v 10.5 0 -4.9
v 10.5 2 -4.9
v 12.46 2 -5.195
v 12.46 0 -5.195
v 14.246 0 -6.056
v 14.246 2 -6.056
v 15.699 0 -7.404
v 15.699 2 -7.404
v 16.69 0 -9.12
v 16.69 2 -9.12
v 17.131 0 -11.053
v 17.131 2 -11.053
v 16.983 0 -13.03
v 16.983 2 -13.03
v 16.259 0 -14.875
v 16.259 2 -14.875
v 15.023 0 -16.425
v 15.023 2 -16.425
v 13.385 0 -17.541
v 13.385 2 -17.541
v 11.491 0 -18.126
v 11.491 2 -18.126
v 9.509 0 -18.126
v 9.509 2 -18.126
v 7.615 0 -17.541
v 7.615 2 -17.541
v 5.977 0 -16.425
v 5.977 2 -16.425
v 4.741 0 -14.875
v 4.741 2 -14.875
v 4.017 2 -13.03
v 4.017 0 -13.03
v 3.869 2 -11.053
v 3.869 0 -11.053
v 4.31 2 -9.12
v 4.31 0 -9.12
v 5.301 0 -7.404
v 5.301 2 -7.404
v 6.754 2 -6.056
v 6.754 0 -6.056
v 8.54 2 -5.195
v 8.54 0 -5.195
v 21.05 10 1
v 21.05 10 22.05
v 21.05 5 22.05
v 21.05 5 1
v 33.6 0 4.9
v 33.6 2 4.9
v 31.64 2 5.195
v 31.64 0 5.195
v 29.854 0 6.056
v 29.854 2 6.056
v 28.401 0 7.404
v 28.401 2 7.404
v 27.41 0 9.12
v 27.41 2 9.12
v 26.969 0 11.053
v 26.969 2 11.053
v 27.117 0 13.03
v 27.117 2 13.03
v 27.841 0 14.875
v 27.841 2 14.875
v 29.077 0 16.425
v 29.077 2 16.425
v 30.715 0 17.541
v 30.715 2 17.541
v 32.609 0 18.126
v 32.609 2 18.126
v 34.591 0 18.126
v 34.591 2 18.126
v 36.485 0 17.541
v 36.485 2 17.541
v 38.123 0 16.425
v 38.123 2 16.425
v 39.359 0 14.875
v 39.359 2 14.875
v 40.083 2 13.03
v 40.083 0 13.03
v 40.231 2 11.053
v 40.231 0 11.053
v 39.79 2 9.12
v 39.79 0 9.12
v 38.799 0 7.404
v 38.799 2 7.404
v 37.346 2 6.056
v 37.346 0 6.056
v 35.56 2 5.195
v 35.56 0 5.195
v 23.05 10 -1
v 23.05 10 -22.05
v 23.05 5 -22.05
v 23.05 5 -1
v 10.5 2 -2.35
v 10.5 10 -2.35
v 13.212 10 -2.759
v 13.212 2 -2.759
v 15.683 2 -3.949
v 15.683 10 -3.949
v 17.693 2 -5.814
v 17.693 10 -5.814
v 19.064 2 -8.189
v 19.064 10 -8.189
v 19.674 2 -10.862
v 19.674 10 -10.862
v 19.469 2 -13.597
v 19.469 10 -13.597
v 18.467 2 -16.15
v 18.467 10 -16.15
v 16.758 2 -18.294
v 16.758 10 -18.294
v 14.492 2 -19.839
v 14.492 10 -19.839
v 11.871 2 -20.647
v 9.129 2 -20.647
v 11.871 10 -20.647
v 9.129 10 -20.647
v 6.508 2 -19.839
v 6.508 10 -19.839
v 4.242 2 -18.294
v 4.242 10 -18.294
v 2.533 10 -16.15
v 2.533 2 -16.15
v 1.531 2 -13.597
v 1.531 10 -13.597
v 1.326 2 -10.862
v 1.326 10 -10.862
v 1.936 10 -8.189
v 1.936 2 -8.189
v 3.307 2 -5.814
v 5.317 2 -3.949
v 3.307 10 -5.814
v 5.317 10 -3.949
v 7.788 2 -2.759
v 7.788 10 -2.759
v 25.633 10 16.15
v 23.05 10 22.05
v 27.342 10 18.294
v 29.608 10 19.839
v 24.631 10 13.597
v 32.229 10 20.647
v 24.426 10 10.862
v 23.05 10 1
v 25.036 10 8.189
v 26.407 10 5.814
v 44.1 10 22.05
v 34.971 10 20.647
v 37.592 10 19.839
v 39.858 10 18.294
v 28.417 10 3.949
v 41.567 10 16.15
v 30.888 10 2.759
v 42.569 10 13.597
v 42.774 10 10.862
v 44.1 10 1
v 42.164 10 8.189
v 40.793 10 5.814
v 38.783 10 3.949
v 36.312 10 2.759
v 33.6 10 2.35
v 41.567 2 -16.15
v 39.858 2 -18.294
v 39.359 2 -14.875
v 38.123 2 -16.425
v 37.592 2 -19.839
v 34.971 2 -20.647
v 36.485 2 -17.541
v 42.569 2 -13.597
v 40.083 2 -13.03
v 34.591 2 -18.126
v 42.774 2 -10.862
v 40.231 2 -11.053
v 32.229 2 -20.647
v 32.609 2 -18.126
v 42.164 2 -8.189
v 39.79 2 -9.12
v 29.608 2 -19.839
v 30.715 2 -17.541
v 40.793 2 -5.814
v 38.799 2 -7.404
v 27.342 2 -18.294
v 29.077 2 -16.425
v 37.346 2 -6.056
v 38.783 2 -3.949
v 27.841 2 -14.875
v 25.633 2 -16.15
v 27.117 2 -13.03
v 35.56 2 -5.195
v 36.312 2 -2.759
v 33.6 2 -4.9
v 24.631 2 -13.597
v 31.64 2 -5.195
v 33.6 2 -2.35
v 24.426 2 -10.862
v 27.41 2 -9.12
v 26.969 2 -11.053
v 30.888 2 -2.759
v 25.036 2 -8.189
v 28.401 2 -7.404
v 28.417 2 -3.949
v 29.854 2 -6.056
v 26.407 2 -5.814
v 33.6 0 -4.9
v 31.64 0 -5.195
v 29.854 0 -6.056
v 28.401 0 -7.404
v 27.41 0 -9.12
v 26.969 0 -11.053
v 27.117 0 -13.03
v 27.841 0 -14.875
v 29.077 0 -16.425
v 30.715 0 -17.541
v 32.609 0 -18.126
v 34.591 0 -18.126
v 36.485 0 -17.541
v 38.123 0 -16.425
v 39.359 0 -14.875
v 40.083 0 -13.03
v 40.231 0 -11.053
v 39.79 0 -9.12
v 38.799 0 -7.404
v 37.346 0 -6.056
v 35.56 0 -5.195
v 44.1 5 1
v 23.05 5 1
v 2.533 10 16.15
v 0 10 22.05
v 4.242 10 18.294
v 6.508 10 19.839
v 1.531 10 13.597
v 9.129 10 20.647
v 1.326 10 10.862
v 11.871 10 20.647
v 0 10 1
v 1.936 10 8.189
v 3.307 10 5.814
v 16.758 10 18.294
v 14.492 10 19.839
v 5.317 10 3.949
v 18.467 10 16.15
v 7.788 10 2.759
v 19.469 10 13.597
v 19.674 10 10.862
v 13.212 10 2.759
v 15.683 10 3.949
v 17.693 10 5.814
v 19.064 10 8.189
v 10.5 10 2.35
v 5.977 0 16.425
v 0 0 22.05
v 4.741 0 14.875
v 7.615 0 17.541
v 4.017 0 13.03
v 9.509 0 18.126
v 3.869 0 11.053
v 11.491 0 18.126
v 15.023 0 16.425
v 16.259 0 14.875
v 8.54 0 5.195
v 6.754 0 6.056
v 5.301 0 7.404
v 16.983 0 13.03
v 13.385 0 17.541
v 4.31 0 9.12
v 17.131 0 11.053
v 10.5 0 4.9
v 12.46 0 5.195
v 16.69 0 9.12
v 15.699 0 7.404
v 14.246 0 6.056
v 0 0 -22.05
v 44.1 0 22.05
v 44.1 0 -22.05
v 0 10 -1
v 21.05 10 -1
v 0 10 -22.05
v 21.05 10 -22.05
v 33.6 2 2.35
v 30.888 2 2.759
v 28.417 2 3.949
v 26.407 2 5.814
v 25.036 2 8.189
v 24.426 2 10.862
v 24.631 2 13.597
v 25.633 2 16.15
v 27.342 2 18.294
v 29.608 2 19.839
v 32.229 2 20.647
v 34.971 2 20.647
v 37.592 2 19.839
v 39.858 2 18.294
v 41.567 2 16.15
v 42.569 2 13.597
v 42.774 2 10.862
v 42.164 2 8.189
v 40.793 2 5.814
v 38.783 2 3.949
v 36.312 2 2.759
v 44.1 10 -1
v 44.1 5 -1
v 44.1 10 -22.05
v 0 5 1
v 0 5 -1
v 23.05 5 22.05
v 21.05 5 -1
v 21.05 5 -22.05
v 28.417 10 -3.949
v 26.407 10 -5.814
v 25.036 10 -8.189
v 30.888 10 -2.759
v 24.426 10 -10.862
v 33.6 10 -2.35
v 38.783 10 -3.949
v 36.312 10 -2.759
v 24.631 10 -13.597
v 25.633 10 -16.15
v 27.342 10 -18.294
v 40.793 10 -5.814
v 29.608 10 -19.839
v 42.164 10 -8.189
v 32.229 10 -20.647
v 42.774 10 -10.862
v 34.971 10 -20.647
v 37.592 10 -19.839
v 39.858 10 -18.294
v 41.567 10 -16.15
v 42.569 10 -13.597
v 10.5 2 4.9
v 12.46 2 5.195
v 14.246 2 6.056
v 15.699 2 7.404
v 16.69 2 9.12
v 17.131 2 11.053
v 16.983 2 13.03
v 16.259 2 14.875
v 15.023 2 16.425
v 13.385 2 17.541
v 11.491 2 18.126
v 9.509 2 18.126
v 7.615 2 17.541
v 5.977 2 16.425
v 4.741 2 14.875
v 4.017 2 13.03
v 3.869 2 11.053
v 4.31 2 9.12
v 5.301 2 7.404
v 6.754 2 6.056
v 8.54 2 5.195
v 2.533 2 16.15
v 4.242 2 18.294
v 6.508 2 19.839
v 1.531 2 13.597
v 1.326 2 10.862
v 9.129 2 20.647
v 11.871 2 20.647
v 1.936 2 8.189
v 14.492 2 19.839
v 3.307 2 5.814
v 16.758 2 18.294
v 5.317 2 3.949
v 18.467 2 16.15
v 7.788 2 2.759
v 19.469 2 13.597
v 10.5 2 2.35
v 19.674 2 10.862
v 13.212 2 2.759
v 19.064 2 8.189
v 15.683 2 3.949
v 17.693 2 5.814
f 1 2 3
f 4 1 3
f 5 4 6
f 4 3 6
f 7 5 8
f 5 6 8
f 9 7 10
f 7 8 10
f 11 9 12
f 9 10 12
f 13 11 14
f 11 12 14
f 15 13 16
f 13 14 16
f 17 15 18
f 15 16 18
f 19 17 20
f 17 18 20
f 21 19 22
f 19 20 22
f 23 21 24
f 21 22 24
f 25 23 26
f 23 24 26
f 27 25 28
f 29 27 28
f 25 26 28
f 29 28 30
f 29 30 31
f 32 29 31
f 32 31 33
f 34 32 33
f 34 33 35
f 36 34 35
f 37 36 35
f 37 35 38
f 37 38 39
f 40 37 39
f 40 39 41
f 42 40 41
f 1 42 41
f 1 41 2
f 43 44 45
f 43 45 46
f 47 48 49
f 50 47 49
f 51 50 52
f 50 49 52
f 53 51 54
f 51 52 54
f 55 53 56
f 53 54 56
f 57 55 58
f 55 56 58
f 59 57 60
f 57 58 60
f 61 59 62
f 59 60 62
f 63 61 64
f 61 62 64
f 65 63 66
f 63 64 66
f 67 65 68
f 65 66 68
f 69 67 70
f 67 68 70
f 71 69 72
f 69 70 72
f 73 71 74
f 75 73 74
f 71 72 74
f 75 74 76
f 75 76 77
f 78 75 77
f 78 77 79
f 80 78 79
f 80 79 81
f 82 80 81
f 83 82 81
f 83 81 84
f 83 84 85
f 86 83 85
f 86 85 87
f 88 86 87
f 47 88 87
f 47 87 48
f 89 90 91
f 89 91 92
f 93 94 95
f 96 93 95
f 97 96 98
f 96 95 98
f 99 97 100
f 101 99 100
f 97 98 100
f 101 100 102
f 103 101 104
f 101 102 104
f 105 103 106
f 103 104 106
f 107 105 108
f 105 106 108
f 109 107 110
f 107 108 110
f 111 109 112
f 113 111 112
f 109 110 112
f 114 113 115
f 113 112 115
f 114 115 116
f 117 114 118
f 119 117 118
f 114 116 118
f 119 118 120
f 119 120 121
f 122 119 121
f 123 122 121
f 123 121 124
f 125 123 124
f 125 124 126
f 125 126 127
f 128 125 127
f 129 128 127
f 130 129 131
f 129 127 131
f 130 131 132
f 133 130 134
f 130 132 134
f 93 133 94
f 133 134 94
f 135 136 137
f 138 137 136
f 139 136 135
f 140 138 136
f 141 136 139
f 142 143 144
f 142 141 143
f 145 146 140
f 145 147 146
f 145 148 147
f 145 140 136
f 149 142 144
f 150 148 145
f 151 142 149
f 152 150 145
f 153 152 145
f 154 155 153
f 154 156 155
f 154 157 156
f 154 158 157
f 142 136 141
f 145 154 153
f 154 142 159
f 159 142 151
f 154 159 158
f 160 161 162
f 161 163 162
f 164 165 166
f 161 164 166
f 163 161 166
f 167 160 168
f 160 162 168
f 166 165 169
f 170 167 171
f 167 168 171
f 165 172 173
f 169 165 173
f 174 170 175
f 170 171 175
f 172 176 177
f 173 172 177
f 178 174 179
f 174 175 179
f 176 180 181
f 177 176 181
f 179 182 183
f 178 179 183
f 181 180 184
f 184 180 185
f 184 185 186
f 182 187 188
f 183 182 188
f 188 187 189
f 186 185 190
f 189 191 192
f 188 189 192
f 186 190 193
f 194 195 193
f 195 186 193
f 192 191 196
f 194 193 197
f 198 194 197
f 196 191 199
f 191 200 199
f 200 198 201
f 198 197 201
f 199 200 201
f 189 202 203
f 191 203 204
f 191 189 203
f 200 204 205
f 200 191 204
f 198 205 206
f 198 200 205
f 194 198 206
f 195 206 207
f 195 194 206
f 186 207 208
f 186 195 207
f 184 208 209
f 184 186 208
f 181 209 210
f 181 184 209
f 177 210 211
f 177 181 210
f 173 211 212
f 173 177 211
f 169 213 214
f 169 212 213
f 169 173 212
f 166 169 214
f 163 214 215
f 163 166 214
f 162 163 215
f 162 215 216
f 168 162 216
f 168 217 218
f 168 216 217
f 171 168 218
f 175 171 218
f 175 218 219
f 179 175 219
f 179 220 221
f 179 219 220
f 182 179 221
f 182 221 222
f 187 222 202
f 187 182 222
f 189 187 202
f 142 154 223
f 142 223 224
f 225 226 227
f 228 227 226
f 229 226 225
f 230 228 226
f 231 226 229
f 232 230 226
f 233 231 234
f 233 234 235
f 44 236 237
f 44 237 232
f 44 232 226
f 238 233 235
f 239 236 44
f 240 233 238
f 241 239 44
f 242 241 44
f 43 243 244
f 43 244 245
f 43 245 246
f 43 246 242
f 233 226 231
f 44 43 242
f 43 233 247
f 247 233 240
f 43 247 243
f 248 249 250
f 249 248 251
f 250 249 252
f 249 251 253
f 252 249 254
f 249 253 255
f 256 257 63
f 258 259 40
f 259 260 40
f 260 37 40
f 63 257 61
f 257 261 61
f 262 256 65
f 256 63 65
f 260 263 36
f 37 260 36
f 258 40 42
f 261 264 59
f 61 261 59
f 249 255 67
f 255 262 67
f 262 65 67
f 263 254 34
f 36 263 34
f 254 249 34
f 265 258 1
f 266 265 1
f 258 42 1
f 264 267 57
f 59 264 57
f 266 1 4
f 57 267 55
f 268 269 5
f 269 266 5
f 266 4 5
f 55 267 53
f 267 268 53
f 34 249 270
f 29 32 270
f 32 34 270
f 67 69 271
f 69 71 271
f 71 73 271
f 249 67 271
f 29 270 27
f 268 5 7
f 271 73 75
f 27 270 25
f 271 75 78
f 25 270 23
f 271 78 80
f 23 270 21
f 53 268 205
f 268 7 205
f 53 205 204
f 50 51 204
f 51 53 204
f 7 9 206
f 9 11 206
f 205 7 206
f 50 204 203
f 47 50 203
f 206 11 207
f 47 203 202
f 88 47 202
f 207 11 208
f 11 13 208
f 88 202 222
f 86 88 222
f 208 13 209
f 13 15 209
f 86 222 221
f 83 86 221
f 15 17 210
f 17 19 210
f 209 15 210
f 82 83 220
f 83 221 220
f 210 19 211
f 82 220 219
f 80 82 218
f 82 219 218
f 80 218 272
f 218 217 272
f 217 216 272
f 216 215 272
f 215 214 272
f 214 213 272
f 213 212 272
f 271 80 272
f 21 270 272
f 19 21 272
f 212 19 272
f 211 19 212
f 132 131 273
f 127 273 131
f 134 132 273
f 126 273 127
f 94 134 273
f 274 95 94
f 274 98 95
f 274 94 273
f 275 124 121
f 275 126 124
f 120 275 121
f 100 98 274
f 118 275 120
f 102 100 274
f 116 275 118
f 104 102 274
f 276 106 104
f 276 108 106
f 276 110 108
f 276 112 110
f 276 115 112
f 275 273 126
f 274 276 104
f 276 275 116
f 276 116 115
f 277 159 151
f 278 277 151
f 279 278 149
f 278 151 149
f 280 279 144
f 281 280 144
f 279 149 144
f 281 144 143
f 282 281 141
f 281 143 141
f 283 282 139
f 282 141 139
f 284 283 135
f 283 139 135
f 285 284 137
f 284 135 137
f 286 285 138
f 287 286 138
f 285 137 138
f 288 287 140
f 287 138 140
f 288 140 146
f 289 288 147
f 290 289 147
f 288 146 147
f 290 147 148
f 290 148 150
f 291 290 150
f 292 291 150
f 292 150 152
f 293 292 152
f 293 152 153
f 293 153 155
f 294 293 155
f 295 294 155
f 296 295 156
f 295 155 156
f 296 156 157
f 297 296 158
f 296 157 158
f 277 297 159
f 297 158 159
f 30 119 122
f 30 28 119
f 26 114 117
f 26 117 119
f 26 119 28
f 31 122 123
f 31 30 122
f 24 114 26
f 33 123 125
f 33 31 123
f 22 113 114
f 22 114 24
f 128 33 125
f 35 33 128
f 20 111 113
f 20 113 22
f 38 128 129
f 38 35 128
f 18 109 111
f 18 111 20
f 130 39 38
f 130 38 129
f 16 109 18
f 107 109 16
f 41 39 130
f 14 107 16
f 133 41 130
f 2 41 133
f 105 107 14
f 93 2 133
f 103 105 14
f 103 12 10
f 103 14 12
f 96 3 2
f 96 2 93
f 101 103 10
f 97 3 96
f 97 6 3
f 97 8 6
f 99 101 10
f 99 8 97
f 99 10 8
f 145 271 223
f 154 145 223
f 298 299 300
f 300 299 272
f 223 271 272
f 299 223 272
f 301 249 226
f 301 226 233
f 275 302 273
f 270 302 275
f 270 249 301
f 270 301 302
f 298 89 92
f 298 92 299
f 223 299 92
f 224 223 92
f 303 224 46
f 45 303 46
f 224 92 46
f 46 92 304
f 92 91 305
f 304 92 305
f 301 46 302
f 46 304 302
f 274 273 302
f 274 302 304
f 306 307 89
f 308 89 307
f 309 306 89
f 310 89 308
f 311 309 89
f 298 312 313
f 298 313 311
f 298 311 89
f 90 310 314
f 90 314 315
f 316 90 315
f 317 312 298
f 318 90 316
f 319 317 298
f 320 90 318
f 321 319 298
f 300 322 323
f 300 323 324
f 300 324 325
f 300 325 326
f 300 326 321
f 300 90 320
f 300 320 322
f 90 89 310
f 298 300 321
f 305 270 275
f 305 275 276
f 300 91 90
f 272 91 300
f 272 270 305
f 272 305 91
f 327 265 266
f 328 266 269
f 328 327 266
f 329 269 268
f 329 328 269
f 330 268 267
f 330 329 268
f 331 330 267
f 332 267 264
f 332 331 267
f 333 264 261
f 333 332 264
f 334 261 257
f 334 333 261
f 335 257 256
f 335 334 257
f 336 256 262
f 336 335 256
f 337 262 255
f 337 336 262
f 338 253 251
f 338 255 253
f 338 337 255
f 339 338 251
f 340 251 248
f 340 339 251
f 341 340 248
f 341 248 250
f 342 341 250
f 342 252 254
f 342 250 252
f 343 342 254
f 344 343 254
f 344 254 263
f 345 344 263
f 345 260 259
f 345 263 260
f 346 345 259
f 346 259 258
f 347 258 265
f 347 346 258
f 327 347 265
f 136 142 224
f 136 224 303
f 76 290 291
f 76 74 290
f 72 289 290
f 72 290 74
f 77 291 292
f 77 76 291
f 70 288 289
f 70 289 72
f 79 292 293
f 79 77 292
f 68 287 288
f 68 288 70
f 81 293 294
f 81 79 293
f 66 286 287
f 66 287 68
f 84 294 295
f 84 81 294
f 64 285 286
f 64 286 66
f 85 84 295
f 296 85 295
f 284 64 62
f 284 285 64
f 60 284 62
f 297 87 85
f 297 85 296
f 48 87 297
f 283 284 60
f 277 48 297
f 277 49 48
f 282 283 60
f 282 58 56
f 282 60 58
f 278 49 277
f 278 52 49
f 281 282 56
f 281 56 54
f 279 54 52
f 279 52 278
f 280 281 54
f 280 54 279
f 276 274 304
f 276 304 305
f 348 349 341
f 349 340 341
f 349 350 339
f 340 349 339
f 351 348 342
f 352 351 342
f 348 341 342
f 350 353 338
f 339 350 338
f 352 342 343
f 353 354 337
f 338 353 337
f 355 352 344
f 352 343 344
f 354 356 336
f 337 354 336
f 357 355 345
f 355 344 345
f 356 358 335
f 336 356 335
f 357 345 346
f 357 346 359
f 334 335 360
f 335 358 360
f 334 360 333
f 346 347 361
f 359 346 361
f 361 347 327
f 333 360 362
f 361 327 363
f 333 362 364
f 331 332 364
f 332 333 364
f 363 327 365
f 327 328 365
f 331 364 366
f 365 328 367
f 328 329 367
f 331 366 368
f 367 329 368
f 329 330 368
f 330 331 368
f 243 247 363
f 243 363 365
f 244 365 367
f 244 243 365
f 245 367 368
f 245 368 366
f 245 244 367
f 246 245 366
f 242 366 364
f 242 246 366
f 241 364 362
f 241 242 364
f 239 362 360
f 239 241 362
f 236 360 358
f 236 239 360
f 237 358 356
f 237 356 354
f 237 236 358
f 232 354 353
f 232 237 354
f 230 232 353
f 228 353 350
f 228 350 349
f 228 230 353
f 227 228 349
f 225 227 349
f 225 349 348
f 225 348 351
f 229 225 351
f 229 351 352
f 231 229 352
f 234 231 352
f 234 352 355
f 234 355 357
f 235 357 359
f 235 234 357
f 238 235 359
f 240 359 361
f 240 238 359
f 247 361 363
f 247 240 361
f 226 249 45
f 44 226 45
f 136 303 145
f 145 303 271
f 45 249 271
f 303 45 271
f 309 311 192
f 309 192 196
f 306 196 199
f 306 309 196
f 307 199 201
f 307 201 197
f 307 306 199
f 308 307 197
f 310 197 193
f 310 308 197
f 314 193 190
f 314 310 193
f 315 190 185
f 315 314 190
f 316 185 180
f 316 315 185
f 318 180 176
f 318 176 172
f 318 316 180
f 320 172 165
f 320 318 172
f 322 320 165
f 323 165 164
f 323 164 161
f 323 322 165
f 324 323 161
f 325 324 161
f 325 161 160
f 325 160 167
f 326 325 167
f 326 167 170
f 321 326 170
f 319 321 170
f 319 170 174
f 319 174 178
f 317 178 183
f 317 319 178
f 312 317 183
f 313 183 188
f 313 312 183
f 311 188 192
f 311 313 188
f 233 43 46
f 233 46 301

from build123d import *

# Parameters (mm, degrees)
SKETCH1_W               = 44.1
SKETCH1_H               = 44.1
BOSS_EXTRUDE1_DEPTH     = 10
SKETCH2_R               = 9.2
CUT_EXTRUDE1_DEPTH      = 8
SKETCH5_R               = 6.65
CUT_EXTRUDE4_DEPTH      = 50.9501001
MIRROR2_COPY_1_SKETCH_R = 9.2
MIRROR2_COPY_1_DEPTH    = 8
MIRROR2_COPY_2_SKETCH_R = 6.65
MIRROR2_COPY_2_DEPTH    = 50.9501001
CUT_EXTRUDE3_DEPTH      = 5


with BuildPart() as part:
    # Sketch1 → Boss-Extrude1 (new body)
    with BuildSketch(Plane(origin=(0, 0, 0), x_dir=(1, 0, 0), z_dir=(0, 1, 0))):
        with Locations((22.05, 0)):
            Rectangle(SKETCH1_W, SKETCH1_H)
    extrude(amount=BOSS_EXTRUDE1_DEPTH)

    # Sketch2 → Cut-Extrude1 (cut)
    with BuildSketch(Plane(origin=(0, 10, 0), x_dir=(1, 0, 0), z_dir=(0, 1, 0))):
        with Locations(Location((10.5, 11.55, 0), (0, 0, 270))):
            Circle(SKETCH2_R)
    cut_extrude1 = extrude(amount=-CUT_EXTRUDE1_DEPTH, mode=Mode.SUBTRACT)

    # Sketch5 → Cut-Extrude4 (cut, through all)
    with BuildSketch(Plane(origin=(0, 2, 0), x_dir=(1, 0, 0), z_dir=(0, 1, 0))):
        with Locations(Location((10.5, 11.55, 0), (0, 0, 270))):
            Circle(SKETCH5_R)
    cut_extrude4 = extrude(amount=-CUT_EXTRUDE4_DEPTH, mode=Mode.SUBTRACT)

    # Mirror1: Cut-Extrude1, Cut-Extrude4 across plane
    add(cut_extrude1.mirror(Plane.XY), mode=Mode.SUBTRACT)
    add(cut_extrude4.mirror(Plane.XY), mode=Mode.SUBTRACT)

    # Mirror2: Cut-Extrude1, Cut-Extrude4 across plane
    add(cut_extrude1.mirror(Plane(origin=(22.05, 0, 0), x_dir=(0, 0, 1), z_dir=(1, 0, 0))), mode=Mode.SUBTRACT)
    add(cut_extrude4.mirror(Plane(origin=(22.05, 0, 0), x_dir=(0, 0, 1), z_dir=(1, 0, 0))), mode=Mode.SUBTRACT)

    # Mirror2 copy 1 sketch → Mirror2 copy 1 (cut)
    with BuildSketch(Plane(origin=(44.1, 10, 0), x_dir=(-1, 0, 0), z_dir=(0, 1, 0))):
        with Locations(Location((10.5, 11.55, 0), (0, 0, 270))):
            Circle(MIRROR2_COPY_1_SKETCH_R)
    extrude(amount=-MIRROR2_COPY_1_DEPTH, mode=Mode.SUBTRACT)

    # Mirror2 copy 2 sketch → Mirror2 copy 2 (cut, through all)
    with BuildSketch(Plane(origin=(44.1, 2, 0), x_dir=(-1, 0, 0), z_dir=(0, 1, 0))):
        with Locations(Location((10.5, 11.55, 0), (0, 0, 270))):
            Circle(MIRROR2_COPY_2_SKETCH_R)
    extrude(amount=-MIRROR2_COPY_2_DEPTH, mode=Mode.SUBTRACT)

    # Sketch4 → Cut-Extrude3 (cut)
    with BuildSketch(Plane(origin=(0, 10, 0), x_dir=(1, 0, 0), z_dir=(0, 1, 0))):
        Polygon((21.05, 22.05), (23.05, 22.05), (23.05, 1), (46.251393124, 1), (46.251393124, -1), (23.05, -1), (23.05, -23.362709558), (21.05, -23.362709558), (21.05, -1), (0, -1), (0, 1), (21.05, 1), align=None)
    extrude(amount=-CUT_EXTRUDE3_DEPTH, mode=Mode.SUBTRACT)


solid = part.part
